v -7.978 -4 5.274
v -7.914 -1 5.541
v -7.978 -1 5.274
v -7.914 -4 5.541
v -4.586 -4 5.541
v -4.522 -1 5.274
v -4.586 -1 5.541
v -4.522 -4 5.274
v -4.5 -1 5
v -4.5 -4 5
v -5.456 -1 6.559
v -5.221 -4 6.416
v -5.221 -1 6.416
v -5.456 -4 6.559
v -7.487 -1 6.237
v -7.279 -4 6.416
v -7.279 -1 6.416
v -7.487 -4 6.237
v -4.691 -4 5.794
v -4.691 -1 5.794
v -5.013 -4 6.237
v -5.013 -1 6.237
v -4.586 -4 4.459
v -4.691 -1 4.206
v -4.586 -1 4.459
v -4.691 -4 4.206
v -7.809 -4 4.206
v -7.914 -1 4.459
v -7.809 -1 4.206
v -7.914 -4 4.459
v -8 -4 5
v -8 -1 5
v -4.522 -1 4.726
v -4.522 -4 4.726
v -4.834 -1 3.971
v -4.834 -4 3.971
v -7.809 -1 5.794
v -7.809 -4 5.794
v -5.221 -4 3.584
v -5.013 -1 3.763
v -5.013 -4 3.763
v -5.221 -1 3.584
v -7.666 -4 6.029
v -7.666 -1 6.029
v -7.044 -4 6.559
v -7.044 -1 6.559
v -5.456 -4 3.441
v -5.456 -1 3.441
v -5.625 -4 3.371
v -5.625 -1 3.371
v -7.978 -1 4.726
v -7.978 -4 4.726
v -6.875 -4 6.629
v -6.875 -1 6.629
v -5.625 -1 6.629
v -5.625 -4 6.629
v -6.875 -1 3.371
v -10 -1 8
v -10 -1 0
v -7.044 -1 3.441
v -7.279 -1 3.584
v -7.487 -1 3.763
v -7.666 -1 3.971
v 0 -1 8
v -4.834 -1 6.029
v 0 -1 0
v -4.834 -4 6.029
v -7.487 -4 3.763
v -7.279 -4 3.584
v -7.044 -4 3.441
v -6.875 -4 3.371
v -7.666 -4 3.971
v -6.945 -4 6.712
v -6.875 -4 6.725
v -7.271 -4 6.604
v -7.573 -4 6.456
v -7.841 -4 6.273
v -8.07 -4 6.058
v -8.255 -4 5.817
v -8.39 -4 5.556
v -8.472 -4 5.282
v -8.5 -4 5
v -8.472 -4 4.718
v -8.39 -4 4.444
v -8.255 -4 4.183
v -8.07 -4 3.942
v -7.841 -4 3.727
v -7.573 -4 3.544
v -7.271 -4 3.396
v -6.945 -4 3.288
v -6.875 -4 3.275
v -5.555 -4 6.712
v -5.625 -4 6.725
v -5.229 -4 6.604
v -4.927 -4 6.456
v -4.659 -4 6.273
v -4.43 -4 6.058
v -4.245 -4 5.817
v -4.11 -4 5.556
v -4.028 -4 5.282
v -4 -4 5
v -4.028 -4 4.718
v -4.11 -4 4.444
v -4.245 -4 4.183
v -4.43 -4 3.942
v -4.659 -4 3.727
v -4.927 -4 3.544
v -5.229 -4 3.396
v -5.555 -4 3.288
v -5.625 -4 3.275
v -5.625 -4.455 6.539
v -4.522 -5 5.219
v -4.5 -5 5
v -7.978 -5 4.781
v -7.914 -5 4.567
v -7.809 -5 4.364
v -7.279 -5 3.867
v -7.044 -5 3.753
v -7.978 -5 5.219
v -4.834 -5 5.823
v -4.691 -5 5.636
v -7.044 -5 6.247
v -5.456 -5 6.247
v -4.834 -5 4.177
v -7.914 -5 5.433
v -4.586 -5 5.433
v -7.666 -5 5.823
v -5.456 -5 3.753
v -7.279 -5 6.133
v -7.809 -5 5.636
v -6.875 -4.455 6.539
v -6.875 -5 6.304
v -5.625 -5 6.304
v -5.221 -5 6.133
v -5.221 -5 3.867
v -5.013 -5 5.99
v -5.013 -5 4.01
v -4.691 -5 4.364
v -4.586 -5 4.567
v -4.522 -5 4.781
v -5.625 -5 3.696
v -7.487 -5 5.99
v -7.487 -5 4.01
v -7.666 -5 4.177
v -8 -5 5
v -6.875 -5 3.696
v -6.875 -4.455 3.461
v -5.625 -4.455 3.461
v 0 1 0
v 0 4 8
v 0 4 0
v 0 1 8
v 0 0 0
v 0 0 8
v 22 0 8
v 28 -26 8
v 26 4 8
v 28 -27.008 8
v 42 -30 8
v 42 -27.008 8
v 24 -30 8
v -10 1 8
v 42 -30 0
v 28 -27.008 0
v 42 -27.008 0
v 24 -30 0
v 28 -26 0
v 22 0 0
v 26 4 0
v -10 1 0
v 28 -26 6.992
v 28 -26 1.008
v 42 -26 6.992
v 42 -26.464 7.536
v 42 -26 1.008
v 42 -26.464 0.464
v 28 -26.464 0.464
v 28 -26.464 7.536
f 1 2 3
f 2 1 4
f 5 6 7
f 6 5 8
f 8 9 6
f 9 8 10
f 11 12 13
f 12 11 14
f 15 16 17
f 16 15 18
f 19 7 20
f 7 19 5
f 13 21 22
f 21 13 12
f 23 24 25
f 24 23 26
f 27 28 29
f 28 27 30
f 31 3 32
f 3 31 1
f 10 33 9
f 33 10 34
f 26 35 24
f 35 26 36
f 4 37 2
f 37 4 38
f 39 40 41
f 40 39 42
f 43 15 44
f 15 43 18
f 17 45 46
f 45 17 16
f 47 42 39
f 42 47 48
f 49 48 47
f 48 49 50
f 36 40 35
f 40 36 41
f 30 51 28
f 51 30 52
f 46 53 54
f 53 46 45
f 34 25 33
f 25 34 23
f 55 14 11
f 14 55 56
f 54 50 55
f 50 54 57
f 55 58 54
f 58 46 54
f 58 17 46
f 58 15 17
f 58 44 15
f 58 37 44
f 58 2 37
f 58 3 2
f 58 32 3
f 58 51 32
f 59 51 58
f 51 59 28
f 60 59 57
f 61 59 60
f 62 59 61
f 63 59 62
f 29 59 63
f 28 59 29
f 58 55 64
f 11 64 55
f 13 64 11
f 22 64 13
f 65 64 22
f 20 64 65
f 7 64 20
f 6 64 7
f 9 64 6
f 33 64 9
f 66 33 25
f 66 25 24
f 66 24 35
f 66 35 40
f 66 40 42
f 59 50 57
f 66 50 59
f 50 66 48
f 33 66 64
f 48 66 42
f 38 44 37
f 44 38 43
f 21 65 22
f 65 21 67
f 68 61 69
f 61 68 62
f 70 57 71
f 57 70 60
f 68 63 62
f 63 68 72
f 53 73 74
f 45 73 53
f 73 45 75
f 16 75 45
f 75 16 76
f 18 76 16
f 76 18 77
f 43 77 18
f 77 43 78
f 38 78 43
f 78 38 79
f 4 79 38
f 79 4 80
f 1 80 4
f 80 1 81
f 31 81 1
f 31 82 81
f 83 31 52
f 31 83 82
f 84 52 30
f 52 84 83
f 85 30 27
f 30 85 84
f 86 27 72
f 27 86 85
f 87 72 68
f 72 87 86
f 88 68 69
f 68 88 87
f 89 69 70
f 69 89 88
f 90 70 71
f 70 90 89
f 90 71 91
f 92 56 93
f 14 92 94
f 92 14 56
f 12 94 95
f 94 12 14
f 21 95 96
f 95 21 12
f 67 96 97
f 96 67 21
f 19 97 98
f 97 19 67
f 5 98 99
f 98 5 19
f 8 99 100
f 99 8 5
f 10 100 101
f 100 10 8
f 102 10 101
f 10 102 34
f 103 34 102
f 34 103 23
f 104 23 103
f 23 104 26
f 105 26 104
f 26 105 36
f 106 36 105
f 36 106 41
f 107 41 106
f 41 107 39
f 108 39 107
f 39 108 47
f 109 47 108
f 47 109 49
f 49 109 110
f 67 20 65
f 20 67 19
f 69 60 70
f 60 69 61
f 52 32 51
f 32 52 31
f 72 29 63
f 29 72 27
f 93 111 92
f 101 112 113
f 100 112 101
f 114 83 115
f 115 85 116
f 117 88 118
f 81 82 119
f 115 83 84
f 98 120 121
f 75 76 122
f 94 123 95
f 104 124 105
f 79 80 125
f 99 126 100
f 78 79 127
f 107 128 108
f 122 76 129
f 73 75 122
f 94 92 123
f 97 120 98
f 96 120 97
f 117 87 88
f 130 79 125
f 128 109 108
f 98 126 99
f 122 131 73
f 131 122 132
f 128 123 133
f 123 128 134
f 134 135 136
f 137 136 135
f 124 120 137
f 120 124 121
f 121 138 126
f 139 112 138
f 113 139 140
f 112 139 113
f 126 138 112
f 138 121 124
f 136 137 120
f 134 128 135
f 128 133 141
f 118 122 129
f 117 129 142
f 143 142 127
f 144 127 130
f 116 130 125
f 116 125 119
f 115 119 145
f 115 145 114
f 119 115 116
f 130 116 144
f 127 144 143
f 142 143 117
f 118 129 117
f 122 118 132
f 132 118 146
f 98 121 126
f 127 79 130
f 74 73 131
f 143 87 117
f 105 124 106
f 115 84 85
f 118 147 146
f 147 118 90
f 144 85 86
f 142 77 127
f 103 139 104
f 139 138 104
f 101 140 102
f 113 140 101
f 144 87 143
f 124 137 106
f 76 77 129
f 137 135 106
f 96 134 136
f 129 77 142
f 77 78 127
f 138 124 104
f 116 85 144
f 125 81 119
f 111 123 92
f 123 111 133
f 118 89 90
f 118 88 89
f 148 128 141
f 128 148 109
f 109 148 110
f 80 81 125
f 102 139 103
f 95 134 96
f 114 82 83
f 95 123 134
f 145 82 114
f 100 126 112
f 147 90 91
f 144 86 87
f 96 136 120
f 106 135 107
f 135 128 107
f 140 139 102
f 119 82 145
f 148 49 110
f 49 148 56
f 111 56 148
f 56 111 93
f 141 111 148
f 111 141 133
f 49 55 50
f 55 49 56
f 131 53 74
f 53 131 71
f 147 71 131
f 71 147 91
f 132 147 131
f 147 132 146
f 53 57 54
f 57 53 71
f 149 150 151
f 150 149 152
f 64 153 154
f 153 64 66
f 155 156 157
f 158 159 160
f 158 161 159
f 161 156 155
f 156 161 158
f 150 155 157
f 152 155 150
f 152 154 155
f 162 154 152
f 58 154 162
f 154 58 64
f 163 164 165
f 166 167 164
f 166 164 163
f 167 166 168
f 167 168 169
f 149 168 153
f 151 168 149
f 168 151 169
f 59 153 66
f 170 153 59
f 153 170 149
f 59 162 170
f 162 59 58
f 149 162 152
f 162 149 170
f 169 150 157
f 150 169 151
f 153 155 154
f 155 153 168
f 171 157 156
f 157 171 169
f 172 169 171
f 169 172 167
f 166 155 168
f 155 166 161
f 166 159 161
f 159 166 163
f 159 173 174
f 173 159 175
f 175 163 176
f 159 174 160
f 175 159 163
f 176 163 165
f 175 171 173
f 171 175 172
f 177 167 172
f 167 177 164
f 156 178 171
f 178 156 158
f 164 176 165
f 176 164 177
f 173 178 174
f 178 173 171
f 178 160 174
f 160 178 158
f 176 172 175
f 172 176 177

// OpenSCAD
/* Version 1.2 */
//Trigger height from the bottom of should button:
triggerZ=0; // [0:10]
//Distance from face of shoulder button to trigger:
triggerY=30; // [5:50]
//Width of trigger:
triggerWidth=18; // [10:30]
//Horizontal distance from system in tenths of mm:
triggerXoffset=20; // [15:80]
offset=triggerXoffset/10;
//Do you want the snap fit option?
snapFit=1; // [1:Yes, 0:No]
//Round peg is recommended.
pegShape=1; // [0:Square, 1:Round]
//Left or Right Button?
side=1; // [0:Left, 1:Right]

/*[Advanced]*/
//Peg width in hundredths of mm (350 is 3.50mm)
pSize=350;//[222:400]
pegSize=pSize/100;
//Peg Depth in hundredths of mm (400 is 4.00mm)
pDepth=400;//[300:500]
pegDepth=pDepth/100;
//Peg Gap width in hundredths of mm (100 is 1mm)
pGap=125;//[10:150]
pegGap=pGap/100;
//Peg Lip size in hundredths of mm (50 is 0.50mm)
pLip=50;//[10:100]
pegLip=pLip/100;

/* [Hidden] */
pWidth=22;//width of shoulder button face
pThickness=4;//thickness of part
pHeight=8;//height of shoulder button face
height=10;//magic number :-)

if (side==1){
	snap();extension();}
else{
	mirror([-1,0,0]){snap();extension();}
}

module snap(){if (snapFit == 1){
	translate([-10,-1,0])cube([10,2,pHeight]);//snap base

if (pegShape == 0){
	translate([-8, -1-pegDepth, 3])
	difference(){
		union(){
			cube([pegSize, pegDepth, pegSize]);
			translate([-pegLip, 0, 0])cube([pegSize +2*pegLip,1,pegSize]);
			}

		translate([pegSize/2 - pegGap/2, -1, -1])cube([pegGap, pegDepth+1, pegSize+2]);
		}
	}
if (pegShape == 1){
	translate([-8, -1-pegDepth, 3])
	difference(){
		union(){
			translate([pegSize/2,pegDepth,2])
			rotate([90,0,0])
			cylinder(h=pegDepth-1, r=pegSize/2, center=false, $fn=40);

			translate([pegSize/2,1,2])
			scale([1,1,.8])
			rotate([90,0,0])
			cylinder(h=1, r1=pegSize/2+pegLip, r2=pegSize/2, center=false, $fn=40);
			}
		
		translate([pegSize/2 -pegGap/2, -1, -1])cube([pegGap, pegDepth+1, pegSize+2]);
				}
			}
		}
	}

module extension(){
	difference(){
		union(){
			cube([pWidth,pThickness,pHeight]);	
			
			hull(){
				translate([pWidth,0,0])cube([pThickness, pThickness, pHeight]);
				translate([pWidth+offset, -triggerY, triggerZ])cube([pThickness, pThickness, pHeight]);
				}

			translate([pWidth+offset,-triggerY,triggerZ])
			cube([triggerWidth,pThickness,pHeight]);
			}
		
		translate([pWidth+offset+pThickness, -triggerY, triggerZ-1])
		difference(){
			cube([triggerWidth, height, height]);
			
			translate([-1,0,height/2])
			rotate([0,90,0])
			cylinder(h = triggerWidth+2, r=height/2, center = false, $fn=40);
		}
	}
}
// preview[view:south, tilt:top]
